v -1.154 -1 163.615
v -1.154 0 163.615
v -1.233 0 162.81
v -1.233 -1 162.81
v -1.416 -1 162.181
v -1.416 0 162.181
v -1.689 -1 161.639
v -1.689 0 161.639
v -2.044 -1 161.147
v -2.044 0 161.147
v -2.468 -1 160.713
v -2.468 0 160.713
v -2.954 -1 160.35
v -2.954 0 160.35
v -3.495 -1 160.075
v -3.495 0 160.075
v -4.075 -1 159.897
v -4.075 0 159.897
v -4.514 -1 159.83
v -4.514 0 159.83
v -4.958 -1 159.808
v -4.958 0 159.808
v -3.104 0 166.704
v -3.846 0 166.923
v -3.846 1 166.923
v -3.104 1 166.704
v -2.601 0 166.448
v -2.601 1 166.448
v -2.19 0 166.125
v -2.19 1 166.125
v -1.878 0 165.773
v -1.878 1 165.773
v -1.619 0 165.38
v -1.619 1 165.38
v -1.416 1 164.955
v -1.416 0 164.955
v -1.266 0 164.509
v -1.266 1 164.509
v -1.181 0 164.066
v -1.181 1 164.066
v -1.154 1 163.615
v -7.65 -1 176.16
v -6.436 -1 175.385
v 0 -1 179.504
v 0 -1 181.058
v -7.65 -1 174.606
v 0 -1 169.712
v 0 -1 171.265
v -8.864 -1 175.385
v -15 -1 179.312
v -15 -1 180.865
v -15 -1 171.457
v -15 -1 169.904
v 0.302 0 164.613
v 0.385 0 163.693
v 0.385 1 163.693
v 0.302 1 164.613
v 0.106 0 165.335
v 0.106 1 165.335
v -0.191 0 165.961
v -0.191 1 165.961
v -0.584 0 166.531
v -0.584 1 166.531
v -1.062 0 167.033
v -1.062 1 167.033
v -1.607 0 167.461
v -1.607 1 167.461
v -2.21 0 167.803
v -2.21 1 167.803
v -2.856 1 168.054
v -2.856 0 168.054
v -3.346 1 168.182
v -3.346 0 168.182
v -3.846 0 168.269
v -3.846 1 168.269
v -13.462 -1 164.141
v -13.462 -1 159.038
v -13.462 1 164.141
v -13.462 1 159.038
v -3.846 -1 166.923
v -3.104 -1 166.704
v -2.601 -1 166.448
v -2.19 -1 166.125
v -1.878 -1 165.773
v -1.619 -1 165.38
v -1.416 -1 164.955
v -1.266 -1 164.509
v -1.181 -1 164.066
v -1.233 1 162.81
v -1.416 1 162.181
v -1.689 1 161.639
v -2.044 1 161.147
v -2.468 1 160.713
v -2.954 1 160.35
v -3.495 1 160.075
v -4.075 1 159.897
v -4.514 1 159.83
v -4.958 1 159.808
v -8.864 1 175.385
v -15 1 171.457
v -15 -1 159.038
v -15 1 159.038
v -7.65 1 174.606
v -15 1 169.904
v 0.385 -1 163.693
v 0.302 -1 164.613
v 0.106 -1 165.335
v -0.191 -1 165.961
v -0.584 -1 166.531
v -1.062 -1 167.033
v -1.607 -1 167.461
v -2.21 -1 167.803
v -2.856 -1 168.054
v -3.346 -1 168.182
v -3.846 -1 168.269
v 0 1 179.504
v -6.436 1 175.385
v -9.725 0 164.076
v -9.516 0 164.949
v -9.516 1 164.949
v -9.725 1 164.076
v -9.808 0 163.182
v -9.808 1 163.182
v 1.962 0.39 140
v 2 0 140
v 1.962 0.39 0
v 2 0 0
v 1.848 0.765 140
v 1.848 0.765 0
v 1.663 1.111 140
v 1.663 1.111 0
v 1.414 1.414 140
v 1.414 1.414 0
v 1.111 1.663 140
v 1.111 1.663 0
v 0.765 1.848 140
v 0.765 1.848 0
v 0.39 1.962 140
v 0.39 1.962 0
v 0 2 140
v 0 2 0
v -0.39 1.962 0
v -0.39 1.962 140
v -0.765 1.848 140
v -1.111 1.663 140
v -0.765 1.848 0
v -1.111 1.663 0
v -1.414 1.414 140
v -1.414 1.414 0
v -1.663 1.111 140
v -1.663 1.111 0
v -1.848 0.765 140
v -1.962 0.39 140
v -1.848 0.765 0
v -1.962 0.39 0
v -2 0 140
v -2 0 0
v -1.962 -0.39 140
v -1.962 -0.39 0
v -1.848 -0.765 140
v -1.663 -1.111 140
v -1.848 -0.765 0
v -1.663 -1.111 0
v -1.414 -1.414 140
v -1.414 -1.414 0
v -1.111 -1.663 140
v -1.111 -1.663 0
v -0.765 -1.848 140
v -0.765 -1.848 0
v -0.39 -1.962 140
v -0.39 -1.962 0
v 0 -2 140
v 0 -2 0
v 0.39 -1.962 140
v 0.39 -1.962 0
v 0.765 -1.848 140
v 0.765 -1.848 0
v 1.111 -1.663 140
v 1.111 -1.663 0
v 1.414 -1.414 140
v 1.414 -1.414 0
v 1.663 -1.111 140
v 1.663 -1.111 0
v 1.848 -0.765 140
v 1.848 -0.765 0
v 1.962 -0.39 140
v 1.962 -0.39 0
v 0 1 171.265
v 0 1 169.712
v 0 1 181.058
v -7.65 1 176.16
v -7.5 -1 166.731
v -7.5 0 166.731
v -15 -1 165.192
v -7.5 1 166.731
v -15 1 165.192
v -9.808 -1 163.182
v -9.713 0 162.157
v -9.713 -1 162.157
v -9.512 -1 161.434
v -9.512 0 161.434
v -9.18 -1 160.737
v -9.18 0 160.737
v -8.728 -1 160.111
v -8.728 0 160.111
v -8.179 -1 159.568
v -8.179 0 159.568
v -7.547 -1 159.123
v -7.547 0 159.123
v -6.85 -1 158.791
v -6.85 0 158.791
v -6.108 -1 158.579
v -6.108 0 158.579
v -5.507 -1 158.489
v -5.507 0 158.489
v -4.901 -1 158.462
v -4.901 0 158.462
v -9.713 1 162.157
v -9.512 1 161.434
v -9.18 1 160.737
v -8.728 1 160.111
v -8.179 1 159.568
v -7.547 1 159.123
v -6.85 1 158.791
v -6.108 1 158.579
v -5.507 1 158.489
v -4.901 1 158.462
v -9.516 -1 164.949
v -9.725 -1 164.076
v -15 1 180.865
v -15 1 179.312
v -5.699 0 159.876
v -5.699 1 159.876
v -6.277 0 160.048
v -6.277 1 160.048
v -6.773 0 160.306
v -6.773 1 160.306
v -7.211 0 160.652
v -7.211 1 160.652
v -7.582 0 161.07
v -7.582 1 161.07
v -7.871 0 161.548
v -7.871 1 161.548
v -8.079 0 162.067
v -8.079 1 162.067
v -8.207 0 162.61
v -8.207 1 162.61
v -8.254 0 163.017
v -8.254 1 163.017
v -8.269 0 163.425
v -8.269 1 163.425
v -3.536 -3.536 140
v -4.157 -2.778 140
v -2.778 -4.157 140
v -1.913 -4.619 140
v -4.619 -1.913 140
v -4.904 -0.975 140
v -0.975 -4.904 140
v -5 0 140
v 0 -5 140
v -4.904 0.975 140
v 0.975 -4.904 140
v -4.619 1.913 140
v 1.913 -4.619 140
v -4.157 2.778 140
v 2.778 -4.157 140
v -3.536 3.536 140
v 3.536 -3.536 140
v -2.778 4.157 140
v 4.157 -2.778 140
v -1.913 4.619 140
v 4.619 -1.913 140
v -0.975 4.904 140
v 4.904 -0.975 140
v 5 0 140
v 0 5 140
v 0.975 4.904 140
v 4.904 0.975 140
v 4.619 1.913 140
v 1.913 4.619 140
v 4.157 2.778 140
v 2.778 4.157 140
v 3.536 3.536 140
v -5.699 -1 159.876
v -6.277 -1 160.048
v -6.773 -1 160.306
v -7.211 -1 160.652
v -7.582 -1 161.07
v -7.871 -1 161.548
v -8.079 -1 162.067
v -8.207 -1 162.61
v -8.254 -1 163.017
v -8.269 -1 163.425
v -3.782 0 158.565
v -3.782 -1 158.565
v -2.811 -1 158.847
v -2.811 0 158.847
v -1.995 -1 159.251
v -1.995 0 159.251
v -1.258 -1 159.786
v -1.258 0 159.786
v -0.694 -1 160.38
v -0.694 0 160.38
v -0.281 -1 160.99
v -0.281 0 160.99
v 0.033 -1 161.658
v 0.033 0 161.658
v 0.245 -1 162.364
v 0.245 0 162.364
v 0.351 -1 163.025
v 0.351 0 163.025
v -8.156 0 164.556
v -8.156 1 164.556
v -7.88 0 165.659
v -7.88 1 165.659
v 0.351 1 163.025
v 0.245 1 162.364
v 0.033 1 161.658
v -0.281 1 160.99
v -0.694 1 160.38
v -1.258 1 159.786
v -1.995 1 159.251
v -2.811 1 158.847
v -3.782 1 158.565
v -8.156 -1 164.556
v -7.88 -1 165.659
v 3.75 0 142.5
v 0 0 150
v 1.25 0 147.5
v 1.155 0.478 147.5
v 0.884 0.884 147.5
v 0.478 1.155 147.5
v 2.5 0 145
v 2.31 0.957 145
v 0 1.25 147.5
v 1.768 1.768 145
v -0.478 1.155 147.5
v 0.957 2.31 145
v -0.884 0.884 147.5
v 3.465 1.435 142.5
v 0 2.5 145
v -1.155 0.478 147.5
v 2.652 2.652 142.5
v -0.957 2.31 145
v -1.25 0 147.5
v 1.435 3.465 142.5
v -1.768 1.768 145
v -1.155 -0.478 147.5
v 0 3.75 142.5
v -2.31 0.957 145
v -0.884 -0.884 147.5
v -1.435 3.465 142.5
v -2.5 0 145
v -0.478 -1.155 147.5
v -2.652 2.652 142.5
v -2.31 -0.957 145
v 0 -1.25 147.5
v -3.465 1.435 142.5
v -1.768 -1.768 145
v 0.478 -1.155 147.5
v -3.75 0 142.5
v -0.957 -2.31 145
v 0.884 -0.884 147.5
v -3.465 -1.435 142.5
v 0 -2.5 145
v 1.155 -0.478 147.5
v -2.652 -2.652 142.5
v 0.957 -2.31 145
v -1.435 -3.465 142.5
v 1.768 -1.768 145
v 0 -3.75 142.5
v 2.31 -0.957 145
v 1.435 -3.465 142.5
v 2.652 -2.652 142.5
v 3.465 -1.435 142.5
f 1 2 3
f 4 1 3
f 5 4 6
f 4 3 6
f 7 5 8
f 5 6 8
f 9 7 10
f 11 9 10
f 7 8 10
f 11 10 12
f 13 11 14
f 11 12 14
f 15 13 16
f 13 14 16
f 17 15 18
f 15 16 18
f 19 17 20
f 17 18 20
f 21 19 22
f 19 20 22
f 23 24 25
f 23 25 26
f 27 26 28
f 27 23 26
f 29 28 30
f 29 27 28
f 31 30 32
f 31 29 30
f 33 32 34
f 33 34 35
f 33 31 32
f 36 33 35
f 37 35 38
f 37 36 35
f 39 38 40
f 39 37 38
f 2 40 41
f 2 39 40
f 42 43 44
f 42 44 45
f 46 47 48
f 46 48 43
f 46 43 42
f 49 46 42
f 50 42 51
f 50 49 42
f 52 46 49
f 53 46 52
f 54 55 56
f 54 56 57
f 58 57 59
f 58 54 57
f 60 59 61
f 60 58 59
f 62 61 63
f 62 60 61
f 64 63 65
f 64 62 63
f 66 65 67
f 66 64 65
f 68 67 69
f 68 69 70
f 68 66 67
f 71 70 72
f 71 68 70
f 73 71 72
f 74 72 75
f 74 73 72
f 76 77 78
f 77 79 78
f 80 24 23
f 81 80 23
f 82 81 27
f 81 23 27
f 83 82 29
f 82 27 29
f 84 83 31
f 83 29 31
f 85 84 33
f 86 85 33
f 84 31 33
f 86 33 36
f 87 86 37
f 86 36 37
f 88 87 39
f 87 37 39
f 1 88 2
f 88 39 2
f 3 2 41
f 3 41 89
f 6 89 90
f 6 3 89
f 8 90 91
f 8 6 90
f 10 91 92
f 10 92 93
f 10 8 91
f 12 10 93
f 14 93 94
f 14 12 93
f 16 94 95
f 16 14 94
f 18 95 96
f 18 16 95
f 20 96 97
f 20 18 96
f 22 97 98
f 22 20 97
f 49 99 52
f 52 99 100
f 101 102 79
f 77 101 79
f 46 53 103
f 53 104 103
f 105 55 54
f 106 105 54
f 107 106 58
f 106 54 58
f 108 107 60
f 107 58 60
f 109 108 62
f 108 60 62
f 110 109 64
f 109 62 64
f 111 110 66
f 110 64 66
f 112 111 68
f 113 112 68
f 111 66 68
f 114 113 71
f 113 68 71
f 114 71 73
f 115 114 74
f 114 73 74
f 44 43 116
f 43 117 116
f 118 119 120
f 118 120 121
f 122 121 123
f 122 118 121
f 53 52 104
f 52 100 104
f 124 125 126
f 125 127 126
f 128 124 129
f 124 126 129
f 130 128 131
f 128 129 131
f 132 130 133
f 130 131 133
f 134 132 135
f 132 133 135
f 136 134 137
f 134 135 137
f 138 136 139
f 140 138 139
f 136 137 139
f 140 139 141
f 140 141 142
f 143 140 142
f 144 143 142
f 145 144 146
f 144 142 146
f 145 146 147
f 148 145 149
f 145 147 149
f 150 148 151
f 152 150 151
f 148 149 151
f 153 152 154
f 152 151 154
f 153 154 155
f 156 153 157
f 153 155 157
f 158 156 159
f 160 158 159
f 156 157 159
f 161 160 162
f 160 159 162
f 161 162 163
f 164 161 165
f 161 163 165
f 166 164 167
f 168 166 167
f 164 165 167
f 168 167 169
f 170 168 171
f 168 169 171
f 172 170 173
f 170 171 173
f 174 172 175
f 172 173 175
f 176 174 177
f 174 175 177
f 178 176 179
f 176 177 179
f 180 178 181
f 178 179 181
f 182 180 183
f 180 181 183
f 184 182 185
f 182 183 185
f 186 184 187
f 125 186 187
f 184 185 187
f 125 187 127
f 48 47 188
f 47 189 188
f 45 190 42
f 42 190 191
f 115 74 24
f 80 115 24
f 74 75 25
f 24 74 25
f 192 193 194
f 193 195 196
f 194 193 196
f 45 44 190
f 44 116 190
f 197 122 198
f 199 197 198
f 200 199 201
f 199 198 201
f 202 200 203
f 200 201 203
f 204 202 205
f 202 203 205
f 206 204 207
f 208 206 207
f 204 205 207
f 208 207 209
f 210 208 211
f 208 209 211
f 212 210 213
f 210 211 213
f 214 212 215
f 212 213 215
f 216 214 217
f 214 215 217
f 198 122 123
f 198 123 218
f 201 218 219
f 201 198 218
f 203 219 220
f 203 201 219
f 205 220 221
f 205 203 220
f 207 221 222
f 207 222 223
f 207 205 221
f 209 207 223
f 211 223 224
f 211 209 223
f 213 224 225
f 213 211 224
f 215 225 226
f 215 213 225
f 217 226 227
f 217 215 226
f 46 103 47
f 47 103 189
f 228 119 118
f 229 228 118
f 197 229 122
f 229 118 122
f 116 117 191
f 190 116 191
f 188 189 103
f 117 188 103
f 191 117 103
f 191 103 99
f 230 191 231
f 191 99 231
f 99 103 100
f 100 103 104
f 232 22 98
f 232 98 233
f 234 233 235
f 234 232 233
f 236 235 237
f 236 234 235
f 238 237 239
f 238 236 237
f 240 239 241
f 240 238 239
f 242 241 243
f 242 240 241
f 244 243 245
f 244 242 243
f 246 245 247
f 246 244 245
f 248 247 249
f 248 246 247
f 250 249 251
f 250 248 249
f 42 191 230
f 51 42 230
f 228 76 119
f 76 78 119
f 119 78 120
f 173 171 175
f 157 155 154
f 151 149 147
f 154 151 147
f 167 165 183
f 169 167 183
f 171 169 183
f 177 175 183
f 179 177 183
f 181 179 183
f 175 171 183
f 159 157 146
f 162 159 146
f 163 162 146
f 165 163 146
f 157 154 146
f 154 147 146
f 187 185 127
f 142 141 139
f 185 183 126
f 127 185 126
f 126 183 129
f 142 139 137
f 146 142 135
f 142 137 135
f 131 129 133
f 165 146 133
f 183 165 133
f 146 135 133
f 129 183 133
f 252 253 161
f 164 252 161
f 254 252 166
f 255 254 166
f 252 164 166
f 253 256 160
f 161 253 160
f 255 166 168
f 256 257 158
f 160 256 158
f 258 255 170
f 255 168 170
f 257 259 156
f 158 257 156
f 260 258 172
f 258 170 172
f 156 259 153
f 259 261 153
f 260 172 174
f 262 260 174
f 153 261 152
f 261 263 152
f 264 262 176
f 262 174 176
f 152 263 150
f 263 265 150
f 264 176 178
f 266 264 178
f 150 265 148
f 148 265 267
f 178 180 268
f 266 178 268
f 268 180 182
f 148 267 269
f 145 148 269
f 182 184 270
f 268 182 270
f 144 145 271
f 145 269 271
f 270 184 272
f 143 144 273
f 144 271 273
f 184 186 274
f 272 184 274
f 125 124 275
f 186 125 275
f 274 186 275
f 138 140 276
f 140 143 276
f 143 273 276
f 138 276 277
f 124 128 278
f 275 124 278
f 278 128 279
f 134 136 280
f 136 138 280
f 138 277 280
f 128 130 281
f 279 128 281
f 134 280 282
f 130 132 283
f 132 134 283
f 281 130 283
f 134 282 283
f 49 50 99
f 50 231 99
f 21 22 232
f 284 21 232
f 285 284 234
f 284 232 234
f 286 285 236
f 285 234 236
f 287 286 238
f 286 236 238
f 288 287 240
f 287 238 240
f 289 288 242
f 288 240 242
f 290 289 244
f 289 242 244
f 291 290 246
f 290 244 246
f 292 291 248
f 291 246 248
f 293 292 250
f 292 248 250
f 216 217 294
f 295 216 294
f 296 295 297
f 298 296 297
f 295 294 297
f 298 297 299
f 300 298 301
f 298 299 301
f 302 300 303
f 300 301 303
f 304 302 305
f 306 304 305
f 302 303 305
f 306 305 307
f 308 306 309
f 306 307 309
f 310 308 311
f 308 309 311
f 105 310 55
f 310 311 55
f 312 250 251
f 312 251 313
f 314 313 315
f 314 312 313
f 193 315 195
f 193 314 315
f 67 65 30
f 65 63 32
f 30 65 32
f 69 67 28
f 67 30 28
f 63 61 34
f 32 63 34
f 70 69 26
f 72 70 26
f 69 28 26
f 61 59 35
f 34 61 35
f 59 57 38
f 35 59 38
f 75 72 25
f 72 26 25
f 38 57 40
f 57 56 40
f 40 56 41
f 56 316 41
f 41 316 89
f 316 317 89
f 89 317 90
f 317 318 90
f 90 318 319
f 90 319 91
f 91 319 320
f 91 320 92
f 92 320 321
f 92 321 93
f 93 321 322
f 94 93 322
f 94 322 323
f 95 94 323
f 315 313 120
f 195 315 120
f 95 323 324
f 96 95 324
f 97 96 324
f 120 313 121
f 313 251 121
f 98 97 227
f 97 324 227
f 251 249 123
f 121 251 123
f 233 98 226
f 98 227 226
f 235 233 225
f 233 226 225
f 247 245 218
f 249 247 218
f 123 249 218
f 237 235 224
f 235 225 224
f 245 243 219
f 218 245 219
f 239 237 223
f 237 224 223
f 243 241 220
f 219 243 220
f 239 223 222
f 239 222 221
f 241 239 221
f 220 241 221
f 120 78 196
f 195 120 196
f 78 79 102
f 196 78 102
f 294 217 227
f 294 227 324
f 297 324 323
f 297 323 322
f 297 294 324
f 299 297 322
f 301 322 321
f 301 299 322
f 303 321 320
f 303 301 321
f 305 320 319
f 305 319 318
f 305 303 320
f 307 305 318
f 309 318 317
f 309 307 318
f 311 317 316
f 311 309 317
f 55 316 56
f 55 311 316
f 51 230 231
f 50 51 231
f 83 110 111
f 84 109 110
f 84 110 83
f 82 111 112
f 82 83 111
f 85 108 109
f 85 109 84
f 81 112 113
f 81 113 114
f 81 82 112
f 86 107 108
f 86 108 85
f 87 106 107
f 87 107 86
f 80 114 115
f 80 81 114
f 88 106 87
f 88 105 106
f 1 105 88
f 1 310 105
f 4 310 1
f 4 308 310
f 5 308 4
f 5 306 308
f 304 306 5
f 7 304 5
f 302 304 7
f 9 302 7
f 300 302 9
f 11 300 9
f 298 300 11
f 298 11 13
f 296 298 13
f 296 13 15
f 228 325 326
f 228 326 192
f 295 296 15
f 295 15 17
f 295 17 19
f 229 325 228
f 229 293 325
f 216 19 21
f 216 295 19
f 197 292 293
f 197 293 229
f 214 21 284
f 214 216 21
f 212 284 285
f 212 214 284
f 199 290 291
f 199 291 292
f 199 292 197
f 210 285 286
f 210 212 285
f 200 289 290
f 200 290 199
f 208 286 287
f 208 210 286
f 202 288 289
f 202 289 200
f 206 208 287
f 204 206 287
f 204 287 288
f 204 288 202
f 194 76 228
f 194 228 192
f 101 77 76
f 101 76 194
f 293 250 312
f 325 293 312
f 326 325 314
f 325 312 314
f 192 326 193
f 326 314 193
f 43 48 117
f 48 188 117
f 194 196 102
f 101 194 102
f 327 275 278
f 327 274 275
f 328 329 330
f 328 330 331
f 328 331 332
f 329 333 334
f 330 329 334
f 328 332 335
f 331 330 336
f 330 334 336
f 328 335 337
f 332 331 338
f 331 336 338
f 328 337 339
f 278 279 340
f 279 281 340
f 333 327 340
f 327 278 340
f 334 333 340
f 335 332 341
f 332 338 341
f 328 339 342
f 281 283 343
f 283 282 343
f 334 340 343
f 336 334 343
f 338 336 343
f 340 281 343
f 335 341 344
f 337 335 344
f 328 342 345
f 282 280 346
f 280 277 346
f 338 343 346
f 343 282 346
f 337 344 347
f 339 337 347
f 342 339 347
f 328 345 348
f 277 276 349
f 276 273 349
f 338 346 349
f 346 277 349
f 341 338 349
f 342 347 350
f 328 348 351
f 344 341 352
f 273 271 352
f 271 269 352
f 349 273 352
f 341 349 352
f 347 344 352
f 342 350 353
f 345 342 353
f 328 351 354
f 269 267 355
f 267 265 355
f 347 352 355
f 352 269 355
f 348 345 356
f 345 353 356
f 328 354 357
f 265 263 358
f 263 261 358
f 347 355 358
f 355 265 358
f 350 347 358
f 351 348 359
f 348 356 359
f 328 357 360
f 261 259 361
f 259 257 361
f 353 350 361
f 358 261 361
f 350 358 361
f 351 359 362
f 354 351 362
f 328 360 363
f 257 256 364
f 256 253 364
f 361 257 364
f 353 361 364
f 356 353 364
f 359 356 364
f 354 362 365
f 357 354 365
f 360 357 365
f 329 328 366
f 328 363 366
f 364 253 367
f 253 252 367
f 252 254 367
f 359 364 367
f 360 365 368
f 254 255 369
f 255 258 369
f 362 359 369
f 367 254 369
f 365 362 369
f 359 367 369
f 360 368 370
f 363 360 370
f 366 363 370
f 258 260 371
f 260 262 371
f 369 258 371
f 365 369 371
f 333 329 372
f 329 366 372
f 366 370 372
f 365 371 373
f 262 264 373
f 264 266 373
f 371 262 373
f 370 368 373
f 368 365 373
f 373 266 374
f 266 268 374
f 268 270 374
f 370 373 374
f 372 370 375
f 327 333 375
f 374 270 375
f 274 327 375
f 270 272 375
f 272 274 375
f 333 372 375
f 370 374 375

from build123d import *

# Parameters (mm, degrees)
BOSS_EXTRUDE1_DEPTH        = 1
BOSS_EXTRUDE1_DEPTH_BACK   = 1
BOSS_EXTRUDE1_2_DEPTH      = 1
BOSS_EXTRUDE1_2_DEPTH_BACK = 1


with BuildPart() as part:
    # Sketch2 → Revolve1 (revolve)
    with BuildSketch(Plane(origin=(0, 0, 0), x_dir=(1, 0, 0), z_dir=(0, 1, 0))):
        Polygon((0, -150), (5, -140), (2, -140), (2, 0), (0, 0), align=None)
    revolve(axis=Axis((0, 0, -41.949952025), (0, 0, 1)))


with BuildPart() as body_2:
    # Sketch3 → Boss-Extrude1 (new, two sides: drawn at the far end of the back side and taken through both)
    with BuildSketch(Plane(origin=(0, 0, 0), x_dir=(1, 0, 0), z_dir=(0, 1, 0)).offset(-BOSS_EXTRUDE1_DEPTH_BACK)):
        with BuildLine():
            Line((-15, -159.038461538), (-13.461538462, -159.038461538))
            Line((-13.461538462, -159.038461538), (-13.461538462, -164.140625))
            Line((-13.461538462, -164.140625), (-9.516225962, -164.948918269))
            add(Edge.make_bspline(
                [(-9.516225962, -164.948918269), (-9.560069984, -164.790107379), (-9.645010842, -164.482436397), (-9.739321287, -164.028322707), (-9.79617319, -163.597213264), (-9.803935949, -163.317461676), (-9.807692308, -163.182091346)],
                knots=[0, 0, 0, 0, 1.100273476, 2.13160584, 3.095893838, 4, 4, 4, 4], degree=3))
            add(Edge.make_bspline(
                [(-9.807692308, -163.182091346), (-9.804186599, -163.014558858), (-9.797293501, -162.685148127), (-9.727174227, -162.203929676), (-9.625612174, -161.742241094), (-9.469136601, -161.30689917), (-9.278052021, -160.891016359), (-9.037376819, -160.50173494), (-8.756389114, -160.133591337), (-8.436536051, -159.789129967), (-8.080861965, -159.478102832), (-7.696859719, -159.207830503), (-7.292908883, -158.971932896), (-6.859541679, -158.787953931), (-6.40493156, -158.637809151), (-5.923830784, -158.538803307), (-5.420510455, -158.472671692), (-5.076344015, -158.465298377), (-4.900841346, -158.461538462)],
                knots=[0, 0, 0, 0, 1.052805225, 2.070078116, 3.052532748, 4.020689046, 4.973125432, 5.925915817, 6.89216474, 7.881560752, 8.877013184, 9.857446635, 10.830895175, 11.812622661, 12.812548702, 13.836681939, 14.896847428, 16, 16, 16, 16], degree=3))
            add(Edge.make_bspline(
                [(-4.900841346, -158.461538462), (-4.778604023, -158.464391352), (-4.535781307, -158.470058578), (-4.175152107, -158.498814881), (-3.822210194, -158.554393705), (-3.477602628, -158.628108493), (-3.141006659, -158.726514095), (-2.810537702, -158.841617332), (-2.489814366, -158.984683039), (-2.177420147, -159.143287356), (-1.876930293, -159.318911746), (-1.595549591, -159.51639747), (-1.326856873, -159.721596515), (-1.078831903, -159.945814355), (-0.850512632, -160.186501755), (-0.640770308, -160.442319507), (-0.445840686, -160.710947305), (-0.273693897, -160.996616006), (-0.115280519, -161.292940019), (0.014677308, -161.604204053), (0.130865337, -161.923321274), (0.223477584, -162.254885045), (0.296045678, -162.598144237), (0.345333966, -162.953664705), (0.381232984, -163.319581862), (0.383480228, -163.56761763), (0.384615385, -163.692908654)],
                knots=[0, 0, 0, 0, 1.056393913, 2.098511576, 3.122979385, 4.141471433, 5.141222888, 6.151259816, 7.162667642, 8.172852865, 9.177685681, 10.166741883, 11.141342384, 12.097242845, 13.052202613, 14.005160326, 14.953864445, 15.917140761, 16.884916217, 17.854238259, 18.828761908, 19.81781811, 20.826036654, 21.857789401, 22.917898972, 24, 24, 24, 24], degree=3))
            add(Edge.make_bspline(
                [(0.384615385, -163.692908654), (0.381646688, -163.842365617), (0.375806128, -164.136404537), (0.314983266, -164.567261294), (0.227294847, -164.98155407), (0.097379703, -165.377507265), (-0.072734928, -165.75346953), (-0.274856842, -166.114824558), (-0.515479886, -166.457093514), (-0.792403166, -166.777936406), (-1.096683506, -167.072862145), (-1.423725263, -167.340302978), (-1.773944943, -167.575432851), (-2.146203734, -167.779104688), (-2.539841347, -167.95261453), (-2.956070668, -168.088979128), (-3.392788289, -168.199025207), (-3.693445734, -168.245583276), (-3.846153846, -168.269230769)],
                knots=[0, 0, 0, 0, 1.046872515, 2.059598001, 3.044168548, 4.012104806, 4.973680974, 5.932408326, 6.910122221, 7.900780896, 8.89867654, 9.876692837, 10.858029398, 11.85084981, 12.847361615, 13.868568023, 14.917415949, 16, 16, 16, 16], degree=3))
            Line((-3.846153846, -168.269230769), (-3.846153846, -166.923076923))
            add(Edge.make_bspline(
                [(-3.846153846, -166.923076923), (-3.703097014, -166.889975256), (-3.428133839, -166.826352013), (-3.042054853, -166.686337335), (-2.697889799, -166.516807482), (-2.393534398, -166.310519181), (-2.123417488, -166.071404628), (-1.885256014, -165.793446318), (-1.670131171, -165.483593118), (-1.490506155, -165.13909721), (-1.339196302, -164.774948369), (-1.231216621, -164.395992233), (-1.165854198, -164.007682718), (-1.1578639, -163.746242921), (-1.153846154, -163.614783654)],
                knots=[0, 0, 0, 0, 1.13623081, 2.183898708, 3.172478118, 4.09966615, 5.022692284, 5.957376522, 6.927682873, 7.937366477, 8.960015386, 9.976409503, 10.982481913, 12, 12, 12, 12], degree=3))
            add(Edge.make_bspline(
                [(-1.153846154, -163.614783654), (-1.157393206, -163.486401212), (-1.16437738, -163.233615134), (-1.217265273, -162.861410111), (-1.300858252, -162.503110451), (-1.417967227, -162.158080124), (-1.572895535, -161.828014544), (-1.763216032, -161.51338039), (-1.984180393, -161.209695419), (-2.236734594, -160.924952163), (-2.51520754, -160.664225413), (-2.812959591, -160.433838444), (-3.130605369, -160.241938327), (-3.462632597, -160.080220468), (-3.81268371, -159.957420683), (-4.179117276, -159.86981646), (-4.562838631, -159.818374784), (-4.824564243, -159.811298298), (-4.957932692, -159.807692308)],
                knots=[0, 0, 0, 0, 1.027268864, 2.022700798, 3.002744649, 3.968653148, 4.933396556, 5.915045722, 6.907600446, 7.935526002, 8.956456544, 9.95700807, 10.942805781, 11.92166854, 12.907987664, 13.905483474, 14.932689774, 16, 16, 16, 16], degree=3))
            add(Edge.make_bspline(
                [(-4.957932692, -159.807692308), (-5.078271566, -159.810428617), (-5.312824471, -159.815761966), (-5.657184407, -159.861932413), (-5.983536333, -159.939059418), (-6.293300258, -160.048872604), (-6.585485797, -160.18592297), (-6.859449051, -160.357993861), (-7.117765997, -160.557758345), (-7.35378905, -160.790978855), (-7.571970379, -161.044674492), (-7.757289776, -161.325361455), (-7.914888843, -161.625546446), (-8.044013421, -161.945785751), (-8.146871035, -162.286473834), (-8.217957334, -162.647794189), (-8.260494301, -163.029829166), (-8.266264657, -163.291153355), (-8.269230769, -163.425480769)],
                knots=[0, 0, 0, 0, 1.045723156, 2.038222538, 3.013889863, 3.95567481, 4.890389958, 5.81331128, 6.76251276, 7.723027653, 8.692928204, 9.666105983, 10.639751036, 11.635719707, 12.66315958, 13.728667616, 14.832476222, 16, 16, 16, 16], degree=3))
            add(Edge.make_bspline(
                [(-8.269230769, -163.425480769), (-8.266742521, -163.541747607), (-8.261604921, -163.78180913), (-8.223777077, -164.150049816), (-8.16275153, -164.537014343), (-8.078810469, -164.941219324), (-7.968962997, -165.363878644), (-7.837329423, -165.804100362), (-7.679949429, -166.262810076), (-7.561097084, -166.571886037), (-7.5, -166.730769231)],
                knots=[0, 0, 0, 0, 0.817624296, 1.688186739, 2.600797293, 3.572016777, 4.590301741, 5.671205678, 6.80286297, 8, 8, 8, 8], degree=3))
            Line((-7.5, -166.730769231), (-15, -165.192307692))
            Line((-15, -165.192307692), (-15, -159.038461538))
        make_face()
    extrude(amount=BOSS_EXTRUDE1_DEPTH + BOSS_EXTRUDE1_DEPTH_BACK)


with BuildPart() as body_3:
    # Sketch3 → Boss-Extrude1 2 (new, two sides: drawn at the far end of the back side and taken through both)
    with BuildSketch(Plane(origin=(0, 0, 0), x_dir=(1, 0, 0), z_dir=(0, 1, 0)).offset(-BOSS_EXTRUDE1_2_DEPTH_BACK)):
        Polygon((-15, -180.865384615), (-15, -179.311899038), (-8.864182692, -175.384615385), (-15, -171.457331731), (-15, -169.903846154), (-7.650240385, -174.606370192), (0, -169.711538462), (0, -171.265024038), (-6.436298077, -175.384615385), (0, -179.504206731), (0, -181.057692308), (-7.650240385, -176.159855769), align=None)
    extrude(amount=BOSS_EXTRUDE1_2_DEPTH + BOSS_EXTRUDE1_2_DEPTH_BACK)


solid = Compound([part.part, body_2.part, body_3.part])
